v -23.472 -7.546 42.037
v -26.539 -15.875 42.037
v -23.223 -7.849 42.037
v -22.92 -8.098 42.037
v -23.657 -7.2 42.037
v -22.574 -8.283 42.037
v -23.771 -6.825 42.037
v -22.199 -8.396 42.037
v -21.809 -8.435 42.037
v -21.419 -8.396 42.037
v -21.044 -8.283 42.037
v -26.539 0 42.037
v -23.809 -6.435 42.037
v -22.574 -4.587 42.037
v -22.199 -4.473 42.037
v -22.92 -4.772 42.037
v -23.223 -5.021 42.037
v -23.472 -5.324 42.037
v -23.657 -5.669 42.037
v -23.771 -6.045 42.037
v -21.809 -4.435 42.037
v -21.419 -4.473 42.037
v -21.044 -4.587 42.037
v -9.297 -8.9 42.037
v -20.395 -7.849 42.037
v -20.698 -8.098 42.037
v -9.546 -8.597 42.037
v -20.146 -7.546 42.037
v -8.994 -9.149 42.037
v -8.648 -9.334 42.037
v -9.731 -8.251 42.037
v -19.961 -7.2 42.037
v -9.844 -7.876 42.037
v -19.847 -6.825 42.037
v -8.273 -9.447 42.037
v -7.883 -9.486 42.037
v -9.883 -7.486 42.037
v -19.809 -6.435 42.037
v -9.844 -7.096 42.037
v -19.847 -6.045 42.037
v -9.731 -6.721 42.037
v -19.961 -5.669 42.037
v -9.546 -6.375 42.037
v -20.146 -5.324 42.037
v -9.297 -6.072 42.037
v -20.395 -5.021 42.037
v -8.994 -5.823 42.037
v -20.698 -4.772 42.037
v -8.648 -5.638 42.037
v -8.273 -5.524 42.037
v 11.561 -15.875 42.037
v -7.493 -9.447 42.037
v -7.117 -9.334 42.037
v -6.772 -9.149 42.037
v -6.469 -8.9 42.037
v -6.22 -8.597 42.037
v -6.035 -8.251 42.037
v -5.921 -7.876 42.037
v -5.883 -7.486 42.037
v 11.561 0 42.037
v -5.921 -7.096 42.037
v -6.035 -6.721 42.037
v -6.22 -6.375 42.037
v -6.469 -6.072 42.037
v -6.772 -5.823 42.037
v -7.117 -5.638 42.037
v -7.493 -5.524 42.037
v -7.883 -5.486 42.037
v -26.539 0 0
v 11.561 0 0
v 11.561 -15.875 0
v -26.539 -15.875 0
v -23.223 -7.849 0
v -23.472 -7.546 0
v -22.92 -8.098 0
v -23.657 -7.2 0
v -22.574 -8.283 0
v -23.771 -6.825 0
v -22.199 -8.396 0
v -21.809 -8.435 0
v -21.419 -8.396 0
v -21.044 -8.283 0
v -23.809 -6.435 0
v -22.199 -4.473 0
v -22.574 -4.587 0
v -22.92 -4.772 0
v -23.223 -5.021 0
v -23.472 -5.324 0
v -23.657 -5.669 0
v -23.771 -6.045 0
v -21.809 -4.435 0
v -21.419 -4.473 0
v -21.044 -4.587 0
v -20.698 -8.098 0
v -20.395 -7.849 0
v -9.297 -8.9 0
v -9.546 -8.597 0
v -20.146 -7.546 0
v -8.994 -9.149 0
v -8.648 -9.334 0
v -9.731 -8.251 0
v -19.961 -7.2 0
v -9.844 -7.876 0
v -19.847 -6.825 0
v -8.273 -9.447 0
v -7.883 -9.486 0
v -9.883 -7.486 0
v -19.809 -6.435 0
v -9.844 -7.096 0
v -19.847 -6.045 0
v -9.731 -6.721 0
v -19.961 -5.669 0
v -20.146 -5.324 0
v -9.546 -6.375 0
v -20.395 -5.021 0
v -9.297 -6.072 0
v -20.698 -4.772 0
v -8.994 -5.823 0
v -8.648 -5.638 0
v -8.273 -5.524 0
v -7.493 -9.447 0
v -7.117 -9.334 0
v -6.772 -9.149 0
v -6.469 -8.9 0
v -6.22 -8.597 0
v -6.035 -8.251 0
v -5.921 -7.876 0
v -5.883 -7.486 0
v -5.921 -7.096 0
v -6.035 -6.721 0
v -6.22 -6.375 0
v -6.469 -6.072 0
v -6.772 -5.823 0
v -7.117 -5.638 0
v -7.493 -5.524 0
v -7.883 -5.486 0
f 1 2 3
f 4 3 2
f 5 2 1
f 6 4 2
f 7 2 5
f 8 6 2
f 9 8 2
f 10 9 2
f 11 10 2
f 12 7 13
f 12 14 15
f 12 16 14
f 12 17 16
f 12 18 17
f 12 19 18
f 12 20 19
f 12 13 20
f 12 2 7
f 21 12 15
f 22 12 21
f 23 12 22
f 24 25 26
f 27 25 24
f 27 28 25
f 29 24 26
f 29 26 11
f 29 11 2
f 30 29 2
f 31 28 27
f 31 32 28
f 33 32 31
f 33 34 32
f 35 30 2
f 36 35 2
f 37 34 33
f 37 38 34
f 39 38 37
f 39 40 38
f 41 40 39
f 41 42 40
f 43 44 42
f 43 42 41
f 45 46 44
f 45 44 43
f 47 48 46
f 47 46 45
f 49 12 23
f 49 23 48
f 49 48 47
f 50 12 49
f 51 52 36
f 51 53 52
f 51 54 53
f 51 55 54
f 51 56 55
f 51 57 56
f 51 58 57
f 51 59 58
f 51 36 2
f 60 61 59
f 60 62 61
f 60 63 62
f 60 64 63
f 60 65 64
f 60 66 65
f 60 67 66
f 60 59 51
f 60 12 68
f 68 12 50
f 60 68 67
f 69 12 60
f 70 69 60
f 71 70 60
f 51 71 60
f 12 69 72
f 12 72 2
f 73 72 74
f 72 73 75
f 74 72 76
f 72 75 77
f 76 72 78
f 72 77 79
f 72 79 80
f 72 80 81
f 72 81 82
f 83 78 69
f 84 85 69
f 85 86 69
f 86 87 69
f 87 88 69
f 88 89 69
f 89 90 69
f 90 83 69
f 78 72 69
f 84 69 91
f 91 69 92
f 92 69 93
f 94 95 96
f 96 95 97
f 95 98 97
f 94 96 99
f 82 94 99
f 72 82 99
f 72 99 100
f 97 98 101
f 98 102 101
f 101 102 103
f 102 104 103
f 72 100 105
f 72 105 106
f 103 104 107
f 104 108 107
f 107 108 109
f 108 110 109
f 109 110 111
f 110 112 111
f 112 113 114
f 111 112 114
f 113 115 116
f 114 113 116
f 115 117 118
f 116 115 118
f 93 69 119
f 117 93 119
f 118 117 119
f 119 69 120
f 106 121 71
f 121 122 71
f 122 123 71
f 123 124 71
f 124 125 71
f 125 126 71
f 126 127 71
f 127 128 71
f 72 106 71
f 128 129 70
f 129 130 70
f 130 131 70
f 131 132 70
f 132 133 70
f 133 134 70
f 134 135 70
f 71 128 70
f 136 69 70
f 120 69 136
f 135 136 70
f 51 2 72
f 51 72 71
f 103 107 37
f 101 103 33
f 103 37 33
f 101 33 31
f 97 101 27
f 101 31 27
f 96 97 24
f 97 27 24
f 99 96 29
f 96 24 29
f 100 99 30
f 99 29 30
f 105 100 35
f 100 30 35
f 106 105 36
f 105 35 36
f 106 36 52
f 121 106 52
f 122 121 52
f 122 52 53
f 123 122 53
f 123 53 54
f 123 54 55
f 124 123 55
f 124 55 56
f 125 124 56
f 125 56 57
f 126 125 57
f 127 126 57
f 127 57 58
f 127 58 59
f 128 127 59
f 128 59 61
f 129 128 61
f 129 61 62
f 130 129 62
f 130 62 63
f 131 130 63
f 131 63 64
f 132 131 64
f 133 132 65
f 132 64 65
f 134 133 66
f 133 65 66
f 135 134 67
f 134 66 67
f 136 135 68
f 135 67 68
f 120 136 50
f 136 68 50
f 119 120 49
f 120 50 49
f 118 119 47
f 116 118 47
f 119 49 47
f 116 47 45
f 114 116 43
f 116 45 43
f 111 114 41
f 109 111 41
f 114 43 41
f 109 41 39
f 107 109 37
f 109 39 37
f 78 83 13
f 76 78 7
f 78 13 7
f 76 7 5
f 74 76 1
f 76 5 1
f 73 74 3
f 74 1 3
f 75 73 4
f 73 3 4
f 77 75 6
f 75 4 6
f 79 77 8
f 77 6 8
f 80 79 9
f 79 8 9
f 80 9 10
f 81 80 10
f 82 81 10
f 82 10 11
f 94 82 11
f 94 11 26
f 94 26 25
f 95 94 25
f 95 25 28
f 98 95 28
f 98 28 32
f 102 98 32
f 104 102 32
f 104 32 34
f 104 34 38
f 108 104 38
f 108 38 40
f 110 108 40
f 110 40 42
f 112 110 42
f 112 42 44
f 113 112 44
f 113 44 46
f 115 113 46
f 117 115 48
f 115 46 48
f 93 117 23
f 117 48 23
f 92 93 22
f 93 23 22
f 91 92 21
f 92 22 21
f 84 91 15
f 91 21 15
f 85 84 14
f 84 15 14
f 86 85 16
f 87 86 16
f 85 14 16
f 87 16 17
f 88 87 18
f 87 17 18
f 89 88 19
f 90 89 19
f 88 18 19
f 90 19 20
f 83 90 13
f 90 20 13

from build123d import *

# Parameters (mm, degrees)
F0_W     = 38.1
F0_H     = 42.037
F1_DEPTH = 15.875
F3_D     = 4


with BuildPart() as f1:
    # F0 (on Front) → F1 (new body)
    with BuildSketch(Plane.XZ):
        with Locations((-7.488622, 21.0185)):
            Rectangle(F0_W, F0_H)
    extrude(amount=F1_DEPTH)

    # F3 (through all)
    with Locations(Plane(origin=(0, 0, 0), x_dir=(1, 0, 0), z_dir=(0, 0, -1))):
        with Locations((-7.88276, 7.485884), (-21.808967, 6.43485)):
            Hole(F3_D / 2)


solid = f1.part
